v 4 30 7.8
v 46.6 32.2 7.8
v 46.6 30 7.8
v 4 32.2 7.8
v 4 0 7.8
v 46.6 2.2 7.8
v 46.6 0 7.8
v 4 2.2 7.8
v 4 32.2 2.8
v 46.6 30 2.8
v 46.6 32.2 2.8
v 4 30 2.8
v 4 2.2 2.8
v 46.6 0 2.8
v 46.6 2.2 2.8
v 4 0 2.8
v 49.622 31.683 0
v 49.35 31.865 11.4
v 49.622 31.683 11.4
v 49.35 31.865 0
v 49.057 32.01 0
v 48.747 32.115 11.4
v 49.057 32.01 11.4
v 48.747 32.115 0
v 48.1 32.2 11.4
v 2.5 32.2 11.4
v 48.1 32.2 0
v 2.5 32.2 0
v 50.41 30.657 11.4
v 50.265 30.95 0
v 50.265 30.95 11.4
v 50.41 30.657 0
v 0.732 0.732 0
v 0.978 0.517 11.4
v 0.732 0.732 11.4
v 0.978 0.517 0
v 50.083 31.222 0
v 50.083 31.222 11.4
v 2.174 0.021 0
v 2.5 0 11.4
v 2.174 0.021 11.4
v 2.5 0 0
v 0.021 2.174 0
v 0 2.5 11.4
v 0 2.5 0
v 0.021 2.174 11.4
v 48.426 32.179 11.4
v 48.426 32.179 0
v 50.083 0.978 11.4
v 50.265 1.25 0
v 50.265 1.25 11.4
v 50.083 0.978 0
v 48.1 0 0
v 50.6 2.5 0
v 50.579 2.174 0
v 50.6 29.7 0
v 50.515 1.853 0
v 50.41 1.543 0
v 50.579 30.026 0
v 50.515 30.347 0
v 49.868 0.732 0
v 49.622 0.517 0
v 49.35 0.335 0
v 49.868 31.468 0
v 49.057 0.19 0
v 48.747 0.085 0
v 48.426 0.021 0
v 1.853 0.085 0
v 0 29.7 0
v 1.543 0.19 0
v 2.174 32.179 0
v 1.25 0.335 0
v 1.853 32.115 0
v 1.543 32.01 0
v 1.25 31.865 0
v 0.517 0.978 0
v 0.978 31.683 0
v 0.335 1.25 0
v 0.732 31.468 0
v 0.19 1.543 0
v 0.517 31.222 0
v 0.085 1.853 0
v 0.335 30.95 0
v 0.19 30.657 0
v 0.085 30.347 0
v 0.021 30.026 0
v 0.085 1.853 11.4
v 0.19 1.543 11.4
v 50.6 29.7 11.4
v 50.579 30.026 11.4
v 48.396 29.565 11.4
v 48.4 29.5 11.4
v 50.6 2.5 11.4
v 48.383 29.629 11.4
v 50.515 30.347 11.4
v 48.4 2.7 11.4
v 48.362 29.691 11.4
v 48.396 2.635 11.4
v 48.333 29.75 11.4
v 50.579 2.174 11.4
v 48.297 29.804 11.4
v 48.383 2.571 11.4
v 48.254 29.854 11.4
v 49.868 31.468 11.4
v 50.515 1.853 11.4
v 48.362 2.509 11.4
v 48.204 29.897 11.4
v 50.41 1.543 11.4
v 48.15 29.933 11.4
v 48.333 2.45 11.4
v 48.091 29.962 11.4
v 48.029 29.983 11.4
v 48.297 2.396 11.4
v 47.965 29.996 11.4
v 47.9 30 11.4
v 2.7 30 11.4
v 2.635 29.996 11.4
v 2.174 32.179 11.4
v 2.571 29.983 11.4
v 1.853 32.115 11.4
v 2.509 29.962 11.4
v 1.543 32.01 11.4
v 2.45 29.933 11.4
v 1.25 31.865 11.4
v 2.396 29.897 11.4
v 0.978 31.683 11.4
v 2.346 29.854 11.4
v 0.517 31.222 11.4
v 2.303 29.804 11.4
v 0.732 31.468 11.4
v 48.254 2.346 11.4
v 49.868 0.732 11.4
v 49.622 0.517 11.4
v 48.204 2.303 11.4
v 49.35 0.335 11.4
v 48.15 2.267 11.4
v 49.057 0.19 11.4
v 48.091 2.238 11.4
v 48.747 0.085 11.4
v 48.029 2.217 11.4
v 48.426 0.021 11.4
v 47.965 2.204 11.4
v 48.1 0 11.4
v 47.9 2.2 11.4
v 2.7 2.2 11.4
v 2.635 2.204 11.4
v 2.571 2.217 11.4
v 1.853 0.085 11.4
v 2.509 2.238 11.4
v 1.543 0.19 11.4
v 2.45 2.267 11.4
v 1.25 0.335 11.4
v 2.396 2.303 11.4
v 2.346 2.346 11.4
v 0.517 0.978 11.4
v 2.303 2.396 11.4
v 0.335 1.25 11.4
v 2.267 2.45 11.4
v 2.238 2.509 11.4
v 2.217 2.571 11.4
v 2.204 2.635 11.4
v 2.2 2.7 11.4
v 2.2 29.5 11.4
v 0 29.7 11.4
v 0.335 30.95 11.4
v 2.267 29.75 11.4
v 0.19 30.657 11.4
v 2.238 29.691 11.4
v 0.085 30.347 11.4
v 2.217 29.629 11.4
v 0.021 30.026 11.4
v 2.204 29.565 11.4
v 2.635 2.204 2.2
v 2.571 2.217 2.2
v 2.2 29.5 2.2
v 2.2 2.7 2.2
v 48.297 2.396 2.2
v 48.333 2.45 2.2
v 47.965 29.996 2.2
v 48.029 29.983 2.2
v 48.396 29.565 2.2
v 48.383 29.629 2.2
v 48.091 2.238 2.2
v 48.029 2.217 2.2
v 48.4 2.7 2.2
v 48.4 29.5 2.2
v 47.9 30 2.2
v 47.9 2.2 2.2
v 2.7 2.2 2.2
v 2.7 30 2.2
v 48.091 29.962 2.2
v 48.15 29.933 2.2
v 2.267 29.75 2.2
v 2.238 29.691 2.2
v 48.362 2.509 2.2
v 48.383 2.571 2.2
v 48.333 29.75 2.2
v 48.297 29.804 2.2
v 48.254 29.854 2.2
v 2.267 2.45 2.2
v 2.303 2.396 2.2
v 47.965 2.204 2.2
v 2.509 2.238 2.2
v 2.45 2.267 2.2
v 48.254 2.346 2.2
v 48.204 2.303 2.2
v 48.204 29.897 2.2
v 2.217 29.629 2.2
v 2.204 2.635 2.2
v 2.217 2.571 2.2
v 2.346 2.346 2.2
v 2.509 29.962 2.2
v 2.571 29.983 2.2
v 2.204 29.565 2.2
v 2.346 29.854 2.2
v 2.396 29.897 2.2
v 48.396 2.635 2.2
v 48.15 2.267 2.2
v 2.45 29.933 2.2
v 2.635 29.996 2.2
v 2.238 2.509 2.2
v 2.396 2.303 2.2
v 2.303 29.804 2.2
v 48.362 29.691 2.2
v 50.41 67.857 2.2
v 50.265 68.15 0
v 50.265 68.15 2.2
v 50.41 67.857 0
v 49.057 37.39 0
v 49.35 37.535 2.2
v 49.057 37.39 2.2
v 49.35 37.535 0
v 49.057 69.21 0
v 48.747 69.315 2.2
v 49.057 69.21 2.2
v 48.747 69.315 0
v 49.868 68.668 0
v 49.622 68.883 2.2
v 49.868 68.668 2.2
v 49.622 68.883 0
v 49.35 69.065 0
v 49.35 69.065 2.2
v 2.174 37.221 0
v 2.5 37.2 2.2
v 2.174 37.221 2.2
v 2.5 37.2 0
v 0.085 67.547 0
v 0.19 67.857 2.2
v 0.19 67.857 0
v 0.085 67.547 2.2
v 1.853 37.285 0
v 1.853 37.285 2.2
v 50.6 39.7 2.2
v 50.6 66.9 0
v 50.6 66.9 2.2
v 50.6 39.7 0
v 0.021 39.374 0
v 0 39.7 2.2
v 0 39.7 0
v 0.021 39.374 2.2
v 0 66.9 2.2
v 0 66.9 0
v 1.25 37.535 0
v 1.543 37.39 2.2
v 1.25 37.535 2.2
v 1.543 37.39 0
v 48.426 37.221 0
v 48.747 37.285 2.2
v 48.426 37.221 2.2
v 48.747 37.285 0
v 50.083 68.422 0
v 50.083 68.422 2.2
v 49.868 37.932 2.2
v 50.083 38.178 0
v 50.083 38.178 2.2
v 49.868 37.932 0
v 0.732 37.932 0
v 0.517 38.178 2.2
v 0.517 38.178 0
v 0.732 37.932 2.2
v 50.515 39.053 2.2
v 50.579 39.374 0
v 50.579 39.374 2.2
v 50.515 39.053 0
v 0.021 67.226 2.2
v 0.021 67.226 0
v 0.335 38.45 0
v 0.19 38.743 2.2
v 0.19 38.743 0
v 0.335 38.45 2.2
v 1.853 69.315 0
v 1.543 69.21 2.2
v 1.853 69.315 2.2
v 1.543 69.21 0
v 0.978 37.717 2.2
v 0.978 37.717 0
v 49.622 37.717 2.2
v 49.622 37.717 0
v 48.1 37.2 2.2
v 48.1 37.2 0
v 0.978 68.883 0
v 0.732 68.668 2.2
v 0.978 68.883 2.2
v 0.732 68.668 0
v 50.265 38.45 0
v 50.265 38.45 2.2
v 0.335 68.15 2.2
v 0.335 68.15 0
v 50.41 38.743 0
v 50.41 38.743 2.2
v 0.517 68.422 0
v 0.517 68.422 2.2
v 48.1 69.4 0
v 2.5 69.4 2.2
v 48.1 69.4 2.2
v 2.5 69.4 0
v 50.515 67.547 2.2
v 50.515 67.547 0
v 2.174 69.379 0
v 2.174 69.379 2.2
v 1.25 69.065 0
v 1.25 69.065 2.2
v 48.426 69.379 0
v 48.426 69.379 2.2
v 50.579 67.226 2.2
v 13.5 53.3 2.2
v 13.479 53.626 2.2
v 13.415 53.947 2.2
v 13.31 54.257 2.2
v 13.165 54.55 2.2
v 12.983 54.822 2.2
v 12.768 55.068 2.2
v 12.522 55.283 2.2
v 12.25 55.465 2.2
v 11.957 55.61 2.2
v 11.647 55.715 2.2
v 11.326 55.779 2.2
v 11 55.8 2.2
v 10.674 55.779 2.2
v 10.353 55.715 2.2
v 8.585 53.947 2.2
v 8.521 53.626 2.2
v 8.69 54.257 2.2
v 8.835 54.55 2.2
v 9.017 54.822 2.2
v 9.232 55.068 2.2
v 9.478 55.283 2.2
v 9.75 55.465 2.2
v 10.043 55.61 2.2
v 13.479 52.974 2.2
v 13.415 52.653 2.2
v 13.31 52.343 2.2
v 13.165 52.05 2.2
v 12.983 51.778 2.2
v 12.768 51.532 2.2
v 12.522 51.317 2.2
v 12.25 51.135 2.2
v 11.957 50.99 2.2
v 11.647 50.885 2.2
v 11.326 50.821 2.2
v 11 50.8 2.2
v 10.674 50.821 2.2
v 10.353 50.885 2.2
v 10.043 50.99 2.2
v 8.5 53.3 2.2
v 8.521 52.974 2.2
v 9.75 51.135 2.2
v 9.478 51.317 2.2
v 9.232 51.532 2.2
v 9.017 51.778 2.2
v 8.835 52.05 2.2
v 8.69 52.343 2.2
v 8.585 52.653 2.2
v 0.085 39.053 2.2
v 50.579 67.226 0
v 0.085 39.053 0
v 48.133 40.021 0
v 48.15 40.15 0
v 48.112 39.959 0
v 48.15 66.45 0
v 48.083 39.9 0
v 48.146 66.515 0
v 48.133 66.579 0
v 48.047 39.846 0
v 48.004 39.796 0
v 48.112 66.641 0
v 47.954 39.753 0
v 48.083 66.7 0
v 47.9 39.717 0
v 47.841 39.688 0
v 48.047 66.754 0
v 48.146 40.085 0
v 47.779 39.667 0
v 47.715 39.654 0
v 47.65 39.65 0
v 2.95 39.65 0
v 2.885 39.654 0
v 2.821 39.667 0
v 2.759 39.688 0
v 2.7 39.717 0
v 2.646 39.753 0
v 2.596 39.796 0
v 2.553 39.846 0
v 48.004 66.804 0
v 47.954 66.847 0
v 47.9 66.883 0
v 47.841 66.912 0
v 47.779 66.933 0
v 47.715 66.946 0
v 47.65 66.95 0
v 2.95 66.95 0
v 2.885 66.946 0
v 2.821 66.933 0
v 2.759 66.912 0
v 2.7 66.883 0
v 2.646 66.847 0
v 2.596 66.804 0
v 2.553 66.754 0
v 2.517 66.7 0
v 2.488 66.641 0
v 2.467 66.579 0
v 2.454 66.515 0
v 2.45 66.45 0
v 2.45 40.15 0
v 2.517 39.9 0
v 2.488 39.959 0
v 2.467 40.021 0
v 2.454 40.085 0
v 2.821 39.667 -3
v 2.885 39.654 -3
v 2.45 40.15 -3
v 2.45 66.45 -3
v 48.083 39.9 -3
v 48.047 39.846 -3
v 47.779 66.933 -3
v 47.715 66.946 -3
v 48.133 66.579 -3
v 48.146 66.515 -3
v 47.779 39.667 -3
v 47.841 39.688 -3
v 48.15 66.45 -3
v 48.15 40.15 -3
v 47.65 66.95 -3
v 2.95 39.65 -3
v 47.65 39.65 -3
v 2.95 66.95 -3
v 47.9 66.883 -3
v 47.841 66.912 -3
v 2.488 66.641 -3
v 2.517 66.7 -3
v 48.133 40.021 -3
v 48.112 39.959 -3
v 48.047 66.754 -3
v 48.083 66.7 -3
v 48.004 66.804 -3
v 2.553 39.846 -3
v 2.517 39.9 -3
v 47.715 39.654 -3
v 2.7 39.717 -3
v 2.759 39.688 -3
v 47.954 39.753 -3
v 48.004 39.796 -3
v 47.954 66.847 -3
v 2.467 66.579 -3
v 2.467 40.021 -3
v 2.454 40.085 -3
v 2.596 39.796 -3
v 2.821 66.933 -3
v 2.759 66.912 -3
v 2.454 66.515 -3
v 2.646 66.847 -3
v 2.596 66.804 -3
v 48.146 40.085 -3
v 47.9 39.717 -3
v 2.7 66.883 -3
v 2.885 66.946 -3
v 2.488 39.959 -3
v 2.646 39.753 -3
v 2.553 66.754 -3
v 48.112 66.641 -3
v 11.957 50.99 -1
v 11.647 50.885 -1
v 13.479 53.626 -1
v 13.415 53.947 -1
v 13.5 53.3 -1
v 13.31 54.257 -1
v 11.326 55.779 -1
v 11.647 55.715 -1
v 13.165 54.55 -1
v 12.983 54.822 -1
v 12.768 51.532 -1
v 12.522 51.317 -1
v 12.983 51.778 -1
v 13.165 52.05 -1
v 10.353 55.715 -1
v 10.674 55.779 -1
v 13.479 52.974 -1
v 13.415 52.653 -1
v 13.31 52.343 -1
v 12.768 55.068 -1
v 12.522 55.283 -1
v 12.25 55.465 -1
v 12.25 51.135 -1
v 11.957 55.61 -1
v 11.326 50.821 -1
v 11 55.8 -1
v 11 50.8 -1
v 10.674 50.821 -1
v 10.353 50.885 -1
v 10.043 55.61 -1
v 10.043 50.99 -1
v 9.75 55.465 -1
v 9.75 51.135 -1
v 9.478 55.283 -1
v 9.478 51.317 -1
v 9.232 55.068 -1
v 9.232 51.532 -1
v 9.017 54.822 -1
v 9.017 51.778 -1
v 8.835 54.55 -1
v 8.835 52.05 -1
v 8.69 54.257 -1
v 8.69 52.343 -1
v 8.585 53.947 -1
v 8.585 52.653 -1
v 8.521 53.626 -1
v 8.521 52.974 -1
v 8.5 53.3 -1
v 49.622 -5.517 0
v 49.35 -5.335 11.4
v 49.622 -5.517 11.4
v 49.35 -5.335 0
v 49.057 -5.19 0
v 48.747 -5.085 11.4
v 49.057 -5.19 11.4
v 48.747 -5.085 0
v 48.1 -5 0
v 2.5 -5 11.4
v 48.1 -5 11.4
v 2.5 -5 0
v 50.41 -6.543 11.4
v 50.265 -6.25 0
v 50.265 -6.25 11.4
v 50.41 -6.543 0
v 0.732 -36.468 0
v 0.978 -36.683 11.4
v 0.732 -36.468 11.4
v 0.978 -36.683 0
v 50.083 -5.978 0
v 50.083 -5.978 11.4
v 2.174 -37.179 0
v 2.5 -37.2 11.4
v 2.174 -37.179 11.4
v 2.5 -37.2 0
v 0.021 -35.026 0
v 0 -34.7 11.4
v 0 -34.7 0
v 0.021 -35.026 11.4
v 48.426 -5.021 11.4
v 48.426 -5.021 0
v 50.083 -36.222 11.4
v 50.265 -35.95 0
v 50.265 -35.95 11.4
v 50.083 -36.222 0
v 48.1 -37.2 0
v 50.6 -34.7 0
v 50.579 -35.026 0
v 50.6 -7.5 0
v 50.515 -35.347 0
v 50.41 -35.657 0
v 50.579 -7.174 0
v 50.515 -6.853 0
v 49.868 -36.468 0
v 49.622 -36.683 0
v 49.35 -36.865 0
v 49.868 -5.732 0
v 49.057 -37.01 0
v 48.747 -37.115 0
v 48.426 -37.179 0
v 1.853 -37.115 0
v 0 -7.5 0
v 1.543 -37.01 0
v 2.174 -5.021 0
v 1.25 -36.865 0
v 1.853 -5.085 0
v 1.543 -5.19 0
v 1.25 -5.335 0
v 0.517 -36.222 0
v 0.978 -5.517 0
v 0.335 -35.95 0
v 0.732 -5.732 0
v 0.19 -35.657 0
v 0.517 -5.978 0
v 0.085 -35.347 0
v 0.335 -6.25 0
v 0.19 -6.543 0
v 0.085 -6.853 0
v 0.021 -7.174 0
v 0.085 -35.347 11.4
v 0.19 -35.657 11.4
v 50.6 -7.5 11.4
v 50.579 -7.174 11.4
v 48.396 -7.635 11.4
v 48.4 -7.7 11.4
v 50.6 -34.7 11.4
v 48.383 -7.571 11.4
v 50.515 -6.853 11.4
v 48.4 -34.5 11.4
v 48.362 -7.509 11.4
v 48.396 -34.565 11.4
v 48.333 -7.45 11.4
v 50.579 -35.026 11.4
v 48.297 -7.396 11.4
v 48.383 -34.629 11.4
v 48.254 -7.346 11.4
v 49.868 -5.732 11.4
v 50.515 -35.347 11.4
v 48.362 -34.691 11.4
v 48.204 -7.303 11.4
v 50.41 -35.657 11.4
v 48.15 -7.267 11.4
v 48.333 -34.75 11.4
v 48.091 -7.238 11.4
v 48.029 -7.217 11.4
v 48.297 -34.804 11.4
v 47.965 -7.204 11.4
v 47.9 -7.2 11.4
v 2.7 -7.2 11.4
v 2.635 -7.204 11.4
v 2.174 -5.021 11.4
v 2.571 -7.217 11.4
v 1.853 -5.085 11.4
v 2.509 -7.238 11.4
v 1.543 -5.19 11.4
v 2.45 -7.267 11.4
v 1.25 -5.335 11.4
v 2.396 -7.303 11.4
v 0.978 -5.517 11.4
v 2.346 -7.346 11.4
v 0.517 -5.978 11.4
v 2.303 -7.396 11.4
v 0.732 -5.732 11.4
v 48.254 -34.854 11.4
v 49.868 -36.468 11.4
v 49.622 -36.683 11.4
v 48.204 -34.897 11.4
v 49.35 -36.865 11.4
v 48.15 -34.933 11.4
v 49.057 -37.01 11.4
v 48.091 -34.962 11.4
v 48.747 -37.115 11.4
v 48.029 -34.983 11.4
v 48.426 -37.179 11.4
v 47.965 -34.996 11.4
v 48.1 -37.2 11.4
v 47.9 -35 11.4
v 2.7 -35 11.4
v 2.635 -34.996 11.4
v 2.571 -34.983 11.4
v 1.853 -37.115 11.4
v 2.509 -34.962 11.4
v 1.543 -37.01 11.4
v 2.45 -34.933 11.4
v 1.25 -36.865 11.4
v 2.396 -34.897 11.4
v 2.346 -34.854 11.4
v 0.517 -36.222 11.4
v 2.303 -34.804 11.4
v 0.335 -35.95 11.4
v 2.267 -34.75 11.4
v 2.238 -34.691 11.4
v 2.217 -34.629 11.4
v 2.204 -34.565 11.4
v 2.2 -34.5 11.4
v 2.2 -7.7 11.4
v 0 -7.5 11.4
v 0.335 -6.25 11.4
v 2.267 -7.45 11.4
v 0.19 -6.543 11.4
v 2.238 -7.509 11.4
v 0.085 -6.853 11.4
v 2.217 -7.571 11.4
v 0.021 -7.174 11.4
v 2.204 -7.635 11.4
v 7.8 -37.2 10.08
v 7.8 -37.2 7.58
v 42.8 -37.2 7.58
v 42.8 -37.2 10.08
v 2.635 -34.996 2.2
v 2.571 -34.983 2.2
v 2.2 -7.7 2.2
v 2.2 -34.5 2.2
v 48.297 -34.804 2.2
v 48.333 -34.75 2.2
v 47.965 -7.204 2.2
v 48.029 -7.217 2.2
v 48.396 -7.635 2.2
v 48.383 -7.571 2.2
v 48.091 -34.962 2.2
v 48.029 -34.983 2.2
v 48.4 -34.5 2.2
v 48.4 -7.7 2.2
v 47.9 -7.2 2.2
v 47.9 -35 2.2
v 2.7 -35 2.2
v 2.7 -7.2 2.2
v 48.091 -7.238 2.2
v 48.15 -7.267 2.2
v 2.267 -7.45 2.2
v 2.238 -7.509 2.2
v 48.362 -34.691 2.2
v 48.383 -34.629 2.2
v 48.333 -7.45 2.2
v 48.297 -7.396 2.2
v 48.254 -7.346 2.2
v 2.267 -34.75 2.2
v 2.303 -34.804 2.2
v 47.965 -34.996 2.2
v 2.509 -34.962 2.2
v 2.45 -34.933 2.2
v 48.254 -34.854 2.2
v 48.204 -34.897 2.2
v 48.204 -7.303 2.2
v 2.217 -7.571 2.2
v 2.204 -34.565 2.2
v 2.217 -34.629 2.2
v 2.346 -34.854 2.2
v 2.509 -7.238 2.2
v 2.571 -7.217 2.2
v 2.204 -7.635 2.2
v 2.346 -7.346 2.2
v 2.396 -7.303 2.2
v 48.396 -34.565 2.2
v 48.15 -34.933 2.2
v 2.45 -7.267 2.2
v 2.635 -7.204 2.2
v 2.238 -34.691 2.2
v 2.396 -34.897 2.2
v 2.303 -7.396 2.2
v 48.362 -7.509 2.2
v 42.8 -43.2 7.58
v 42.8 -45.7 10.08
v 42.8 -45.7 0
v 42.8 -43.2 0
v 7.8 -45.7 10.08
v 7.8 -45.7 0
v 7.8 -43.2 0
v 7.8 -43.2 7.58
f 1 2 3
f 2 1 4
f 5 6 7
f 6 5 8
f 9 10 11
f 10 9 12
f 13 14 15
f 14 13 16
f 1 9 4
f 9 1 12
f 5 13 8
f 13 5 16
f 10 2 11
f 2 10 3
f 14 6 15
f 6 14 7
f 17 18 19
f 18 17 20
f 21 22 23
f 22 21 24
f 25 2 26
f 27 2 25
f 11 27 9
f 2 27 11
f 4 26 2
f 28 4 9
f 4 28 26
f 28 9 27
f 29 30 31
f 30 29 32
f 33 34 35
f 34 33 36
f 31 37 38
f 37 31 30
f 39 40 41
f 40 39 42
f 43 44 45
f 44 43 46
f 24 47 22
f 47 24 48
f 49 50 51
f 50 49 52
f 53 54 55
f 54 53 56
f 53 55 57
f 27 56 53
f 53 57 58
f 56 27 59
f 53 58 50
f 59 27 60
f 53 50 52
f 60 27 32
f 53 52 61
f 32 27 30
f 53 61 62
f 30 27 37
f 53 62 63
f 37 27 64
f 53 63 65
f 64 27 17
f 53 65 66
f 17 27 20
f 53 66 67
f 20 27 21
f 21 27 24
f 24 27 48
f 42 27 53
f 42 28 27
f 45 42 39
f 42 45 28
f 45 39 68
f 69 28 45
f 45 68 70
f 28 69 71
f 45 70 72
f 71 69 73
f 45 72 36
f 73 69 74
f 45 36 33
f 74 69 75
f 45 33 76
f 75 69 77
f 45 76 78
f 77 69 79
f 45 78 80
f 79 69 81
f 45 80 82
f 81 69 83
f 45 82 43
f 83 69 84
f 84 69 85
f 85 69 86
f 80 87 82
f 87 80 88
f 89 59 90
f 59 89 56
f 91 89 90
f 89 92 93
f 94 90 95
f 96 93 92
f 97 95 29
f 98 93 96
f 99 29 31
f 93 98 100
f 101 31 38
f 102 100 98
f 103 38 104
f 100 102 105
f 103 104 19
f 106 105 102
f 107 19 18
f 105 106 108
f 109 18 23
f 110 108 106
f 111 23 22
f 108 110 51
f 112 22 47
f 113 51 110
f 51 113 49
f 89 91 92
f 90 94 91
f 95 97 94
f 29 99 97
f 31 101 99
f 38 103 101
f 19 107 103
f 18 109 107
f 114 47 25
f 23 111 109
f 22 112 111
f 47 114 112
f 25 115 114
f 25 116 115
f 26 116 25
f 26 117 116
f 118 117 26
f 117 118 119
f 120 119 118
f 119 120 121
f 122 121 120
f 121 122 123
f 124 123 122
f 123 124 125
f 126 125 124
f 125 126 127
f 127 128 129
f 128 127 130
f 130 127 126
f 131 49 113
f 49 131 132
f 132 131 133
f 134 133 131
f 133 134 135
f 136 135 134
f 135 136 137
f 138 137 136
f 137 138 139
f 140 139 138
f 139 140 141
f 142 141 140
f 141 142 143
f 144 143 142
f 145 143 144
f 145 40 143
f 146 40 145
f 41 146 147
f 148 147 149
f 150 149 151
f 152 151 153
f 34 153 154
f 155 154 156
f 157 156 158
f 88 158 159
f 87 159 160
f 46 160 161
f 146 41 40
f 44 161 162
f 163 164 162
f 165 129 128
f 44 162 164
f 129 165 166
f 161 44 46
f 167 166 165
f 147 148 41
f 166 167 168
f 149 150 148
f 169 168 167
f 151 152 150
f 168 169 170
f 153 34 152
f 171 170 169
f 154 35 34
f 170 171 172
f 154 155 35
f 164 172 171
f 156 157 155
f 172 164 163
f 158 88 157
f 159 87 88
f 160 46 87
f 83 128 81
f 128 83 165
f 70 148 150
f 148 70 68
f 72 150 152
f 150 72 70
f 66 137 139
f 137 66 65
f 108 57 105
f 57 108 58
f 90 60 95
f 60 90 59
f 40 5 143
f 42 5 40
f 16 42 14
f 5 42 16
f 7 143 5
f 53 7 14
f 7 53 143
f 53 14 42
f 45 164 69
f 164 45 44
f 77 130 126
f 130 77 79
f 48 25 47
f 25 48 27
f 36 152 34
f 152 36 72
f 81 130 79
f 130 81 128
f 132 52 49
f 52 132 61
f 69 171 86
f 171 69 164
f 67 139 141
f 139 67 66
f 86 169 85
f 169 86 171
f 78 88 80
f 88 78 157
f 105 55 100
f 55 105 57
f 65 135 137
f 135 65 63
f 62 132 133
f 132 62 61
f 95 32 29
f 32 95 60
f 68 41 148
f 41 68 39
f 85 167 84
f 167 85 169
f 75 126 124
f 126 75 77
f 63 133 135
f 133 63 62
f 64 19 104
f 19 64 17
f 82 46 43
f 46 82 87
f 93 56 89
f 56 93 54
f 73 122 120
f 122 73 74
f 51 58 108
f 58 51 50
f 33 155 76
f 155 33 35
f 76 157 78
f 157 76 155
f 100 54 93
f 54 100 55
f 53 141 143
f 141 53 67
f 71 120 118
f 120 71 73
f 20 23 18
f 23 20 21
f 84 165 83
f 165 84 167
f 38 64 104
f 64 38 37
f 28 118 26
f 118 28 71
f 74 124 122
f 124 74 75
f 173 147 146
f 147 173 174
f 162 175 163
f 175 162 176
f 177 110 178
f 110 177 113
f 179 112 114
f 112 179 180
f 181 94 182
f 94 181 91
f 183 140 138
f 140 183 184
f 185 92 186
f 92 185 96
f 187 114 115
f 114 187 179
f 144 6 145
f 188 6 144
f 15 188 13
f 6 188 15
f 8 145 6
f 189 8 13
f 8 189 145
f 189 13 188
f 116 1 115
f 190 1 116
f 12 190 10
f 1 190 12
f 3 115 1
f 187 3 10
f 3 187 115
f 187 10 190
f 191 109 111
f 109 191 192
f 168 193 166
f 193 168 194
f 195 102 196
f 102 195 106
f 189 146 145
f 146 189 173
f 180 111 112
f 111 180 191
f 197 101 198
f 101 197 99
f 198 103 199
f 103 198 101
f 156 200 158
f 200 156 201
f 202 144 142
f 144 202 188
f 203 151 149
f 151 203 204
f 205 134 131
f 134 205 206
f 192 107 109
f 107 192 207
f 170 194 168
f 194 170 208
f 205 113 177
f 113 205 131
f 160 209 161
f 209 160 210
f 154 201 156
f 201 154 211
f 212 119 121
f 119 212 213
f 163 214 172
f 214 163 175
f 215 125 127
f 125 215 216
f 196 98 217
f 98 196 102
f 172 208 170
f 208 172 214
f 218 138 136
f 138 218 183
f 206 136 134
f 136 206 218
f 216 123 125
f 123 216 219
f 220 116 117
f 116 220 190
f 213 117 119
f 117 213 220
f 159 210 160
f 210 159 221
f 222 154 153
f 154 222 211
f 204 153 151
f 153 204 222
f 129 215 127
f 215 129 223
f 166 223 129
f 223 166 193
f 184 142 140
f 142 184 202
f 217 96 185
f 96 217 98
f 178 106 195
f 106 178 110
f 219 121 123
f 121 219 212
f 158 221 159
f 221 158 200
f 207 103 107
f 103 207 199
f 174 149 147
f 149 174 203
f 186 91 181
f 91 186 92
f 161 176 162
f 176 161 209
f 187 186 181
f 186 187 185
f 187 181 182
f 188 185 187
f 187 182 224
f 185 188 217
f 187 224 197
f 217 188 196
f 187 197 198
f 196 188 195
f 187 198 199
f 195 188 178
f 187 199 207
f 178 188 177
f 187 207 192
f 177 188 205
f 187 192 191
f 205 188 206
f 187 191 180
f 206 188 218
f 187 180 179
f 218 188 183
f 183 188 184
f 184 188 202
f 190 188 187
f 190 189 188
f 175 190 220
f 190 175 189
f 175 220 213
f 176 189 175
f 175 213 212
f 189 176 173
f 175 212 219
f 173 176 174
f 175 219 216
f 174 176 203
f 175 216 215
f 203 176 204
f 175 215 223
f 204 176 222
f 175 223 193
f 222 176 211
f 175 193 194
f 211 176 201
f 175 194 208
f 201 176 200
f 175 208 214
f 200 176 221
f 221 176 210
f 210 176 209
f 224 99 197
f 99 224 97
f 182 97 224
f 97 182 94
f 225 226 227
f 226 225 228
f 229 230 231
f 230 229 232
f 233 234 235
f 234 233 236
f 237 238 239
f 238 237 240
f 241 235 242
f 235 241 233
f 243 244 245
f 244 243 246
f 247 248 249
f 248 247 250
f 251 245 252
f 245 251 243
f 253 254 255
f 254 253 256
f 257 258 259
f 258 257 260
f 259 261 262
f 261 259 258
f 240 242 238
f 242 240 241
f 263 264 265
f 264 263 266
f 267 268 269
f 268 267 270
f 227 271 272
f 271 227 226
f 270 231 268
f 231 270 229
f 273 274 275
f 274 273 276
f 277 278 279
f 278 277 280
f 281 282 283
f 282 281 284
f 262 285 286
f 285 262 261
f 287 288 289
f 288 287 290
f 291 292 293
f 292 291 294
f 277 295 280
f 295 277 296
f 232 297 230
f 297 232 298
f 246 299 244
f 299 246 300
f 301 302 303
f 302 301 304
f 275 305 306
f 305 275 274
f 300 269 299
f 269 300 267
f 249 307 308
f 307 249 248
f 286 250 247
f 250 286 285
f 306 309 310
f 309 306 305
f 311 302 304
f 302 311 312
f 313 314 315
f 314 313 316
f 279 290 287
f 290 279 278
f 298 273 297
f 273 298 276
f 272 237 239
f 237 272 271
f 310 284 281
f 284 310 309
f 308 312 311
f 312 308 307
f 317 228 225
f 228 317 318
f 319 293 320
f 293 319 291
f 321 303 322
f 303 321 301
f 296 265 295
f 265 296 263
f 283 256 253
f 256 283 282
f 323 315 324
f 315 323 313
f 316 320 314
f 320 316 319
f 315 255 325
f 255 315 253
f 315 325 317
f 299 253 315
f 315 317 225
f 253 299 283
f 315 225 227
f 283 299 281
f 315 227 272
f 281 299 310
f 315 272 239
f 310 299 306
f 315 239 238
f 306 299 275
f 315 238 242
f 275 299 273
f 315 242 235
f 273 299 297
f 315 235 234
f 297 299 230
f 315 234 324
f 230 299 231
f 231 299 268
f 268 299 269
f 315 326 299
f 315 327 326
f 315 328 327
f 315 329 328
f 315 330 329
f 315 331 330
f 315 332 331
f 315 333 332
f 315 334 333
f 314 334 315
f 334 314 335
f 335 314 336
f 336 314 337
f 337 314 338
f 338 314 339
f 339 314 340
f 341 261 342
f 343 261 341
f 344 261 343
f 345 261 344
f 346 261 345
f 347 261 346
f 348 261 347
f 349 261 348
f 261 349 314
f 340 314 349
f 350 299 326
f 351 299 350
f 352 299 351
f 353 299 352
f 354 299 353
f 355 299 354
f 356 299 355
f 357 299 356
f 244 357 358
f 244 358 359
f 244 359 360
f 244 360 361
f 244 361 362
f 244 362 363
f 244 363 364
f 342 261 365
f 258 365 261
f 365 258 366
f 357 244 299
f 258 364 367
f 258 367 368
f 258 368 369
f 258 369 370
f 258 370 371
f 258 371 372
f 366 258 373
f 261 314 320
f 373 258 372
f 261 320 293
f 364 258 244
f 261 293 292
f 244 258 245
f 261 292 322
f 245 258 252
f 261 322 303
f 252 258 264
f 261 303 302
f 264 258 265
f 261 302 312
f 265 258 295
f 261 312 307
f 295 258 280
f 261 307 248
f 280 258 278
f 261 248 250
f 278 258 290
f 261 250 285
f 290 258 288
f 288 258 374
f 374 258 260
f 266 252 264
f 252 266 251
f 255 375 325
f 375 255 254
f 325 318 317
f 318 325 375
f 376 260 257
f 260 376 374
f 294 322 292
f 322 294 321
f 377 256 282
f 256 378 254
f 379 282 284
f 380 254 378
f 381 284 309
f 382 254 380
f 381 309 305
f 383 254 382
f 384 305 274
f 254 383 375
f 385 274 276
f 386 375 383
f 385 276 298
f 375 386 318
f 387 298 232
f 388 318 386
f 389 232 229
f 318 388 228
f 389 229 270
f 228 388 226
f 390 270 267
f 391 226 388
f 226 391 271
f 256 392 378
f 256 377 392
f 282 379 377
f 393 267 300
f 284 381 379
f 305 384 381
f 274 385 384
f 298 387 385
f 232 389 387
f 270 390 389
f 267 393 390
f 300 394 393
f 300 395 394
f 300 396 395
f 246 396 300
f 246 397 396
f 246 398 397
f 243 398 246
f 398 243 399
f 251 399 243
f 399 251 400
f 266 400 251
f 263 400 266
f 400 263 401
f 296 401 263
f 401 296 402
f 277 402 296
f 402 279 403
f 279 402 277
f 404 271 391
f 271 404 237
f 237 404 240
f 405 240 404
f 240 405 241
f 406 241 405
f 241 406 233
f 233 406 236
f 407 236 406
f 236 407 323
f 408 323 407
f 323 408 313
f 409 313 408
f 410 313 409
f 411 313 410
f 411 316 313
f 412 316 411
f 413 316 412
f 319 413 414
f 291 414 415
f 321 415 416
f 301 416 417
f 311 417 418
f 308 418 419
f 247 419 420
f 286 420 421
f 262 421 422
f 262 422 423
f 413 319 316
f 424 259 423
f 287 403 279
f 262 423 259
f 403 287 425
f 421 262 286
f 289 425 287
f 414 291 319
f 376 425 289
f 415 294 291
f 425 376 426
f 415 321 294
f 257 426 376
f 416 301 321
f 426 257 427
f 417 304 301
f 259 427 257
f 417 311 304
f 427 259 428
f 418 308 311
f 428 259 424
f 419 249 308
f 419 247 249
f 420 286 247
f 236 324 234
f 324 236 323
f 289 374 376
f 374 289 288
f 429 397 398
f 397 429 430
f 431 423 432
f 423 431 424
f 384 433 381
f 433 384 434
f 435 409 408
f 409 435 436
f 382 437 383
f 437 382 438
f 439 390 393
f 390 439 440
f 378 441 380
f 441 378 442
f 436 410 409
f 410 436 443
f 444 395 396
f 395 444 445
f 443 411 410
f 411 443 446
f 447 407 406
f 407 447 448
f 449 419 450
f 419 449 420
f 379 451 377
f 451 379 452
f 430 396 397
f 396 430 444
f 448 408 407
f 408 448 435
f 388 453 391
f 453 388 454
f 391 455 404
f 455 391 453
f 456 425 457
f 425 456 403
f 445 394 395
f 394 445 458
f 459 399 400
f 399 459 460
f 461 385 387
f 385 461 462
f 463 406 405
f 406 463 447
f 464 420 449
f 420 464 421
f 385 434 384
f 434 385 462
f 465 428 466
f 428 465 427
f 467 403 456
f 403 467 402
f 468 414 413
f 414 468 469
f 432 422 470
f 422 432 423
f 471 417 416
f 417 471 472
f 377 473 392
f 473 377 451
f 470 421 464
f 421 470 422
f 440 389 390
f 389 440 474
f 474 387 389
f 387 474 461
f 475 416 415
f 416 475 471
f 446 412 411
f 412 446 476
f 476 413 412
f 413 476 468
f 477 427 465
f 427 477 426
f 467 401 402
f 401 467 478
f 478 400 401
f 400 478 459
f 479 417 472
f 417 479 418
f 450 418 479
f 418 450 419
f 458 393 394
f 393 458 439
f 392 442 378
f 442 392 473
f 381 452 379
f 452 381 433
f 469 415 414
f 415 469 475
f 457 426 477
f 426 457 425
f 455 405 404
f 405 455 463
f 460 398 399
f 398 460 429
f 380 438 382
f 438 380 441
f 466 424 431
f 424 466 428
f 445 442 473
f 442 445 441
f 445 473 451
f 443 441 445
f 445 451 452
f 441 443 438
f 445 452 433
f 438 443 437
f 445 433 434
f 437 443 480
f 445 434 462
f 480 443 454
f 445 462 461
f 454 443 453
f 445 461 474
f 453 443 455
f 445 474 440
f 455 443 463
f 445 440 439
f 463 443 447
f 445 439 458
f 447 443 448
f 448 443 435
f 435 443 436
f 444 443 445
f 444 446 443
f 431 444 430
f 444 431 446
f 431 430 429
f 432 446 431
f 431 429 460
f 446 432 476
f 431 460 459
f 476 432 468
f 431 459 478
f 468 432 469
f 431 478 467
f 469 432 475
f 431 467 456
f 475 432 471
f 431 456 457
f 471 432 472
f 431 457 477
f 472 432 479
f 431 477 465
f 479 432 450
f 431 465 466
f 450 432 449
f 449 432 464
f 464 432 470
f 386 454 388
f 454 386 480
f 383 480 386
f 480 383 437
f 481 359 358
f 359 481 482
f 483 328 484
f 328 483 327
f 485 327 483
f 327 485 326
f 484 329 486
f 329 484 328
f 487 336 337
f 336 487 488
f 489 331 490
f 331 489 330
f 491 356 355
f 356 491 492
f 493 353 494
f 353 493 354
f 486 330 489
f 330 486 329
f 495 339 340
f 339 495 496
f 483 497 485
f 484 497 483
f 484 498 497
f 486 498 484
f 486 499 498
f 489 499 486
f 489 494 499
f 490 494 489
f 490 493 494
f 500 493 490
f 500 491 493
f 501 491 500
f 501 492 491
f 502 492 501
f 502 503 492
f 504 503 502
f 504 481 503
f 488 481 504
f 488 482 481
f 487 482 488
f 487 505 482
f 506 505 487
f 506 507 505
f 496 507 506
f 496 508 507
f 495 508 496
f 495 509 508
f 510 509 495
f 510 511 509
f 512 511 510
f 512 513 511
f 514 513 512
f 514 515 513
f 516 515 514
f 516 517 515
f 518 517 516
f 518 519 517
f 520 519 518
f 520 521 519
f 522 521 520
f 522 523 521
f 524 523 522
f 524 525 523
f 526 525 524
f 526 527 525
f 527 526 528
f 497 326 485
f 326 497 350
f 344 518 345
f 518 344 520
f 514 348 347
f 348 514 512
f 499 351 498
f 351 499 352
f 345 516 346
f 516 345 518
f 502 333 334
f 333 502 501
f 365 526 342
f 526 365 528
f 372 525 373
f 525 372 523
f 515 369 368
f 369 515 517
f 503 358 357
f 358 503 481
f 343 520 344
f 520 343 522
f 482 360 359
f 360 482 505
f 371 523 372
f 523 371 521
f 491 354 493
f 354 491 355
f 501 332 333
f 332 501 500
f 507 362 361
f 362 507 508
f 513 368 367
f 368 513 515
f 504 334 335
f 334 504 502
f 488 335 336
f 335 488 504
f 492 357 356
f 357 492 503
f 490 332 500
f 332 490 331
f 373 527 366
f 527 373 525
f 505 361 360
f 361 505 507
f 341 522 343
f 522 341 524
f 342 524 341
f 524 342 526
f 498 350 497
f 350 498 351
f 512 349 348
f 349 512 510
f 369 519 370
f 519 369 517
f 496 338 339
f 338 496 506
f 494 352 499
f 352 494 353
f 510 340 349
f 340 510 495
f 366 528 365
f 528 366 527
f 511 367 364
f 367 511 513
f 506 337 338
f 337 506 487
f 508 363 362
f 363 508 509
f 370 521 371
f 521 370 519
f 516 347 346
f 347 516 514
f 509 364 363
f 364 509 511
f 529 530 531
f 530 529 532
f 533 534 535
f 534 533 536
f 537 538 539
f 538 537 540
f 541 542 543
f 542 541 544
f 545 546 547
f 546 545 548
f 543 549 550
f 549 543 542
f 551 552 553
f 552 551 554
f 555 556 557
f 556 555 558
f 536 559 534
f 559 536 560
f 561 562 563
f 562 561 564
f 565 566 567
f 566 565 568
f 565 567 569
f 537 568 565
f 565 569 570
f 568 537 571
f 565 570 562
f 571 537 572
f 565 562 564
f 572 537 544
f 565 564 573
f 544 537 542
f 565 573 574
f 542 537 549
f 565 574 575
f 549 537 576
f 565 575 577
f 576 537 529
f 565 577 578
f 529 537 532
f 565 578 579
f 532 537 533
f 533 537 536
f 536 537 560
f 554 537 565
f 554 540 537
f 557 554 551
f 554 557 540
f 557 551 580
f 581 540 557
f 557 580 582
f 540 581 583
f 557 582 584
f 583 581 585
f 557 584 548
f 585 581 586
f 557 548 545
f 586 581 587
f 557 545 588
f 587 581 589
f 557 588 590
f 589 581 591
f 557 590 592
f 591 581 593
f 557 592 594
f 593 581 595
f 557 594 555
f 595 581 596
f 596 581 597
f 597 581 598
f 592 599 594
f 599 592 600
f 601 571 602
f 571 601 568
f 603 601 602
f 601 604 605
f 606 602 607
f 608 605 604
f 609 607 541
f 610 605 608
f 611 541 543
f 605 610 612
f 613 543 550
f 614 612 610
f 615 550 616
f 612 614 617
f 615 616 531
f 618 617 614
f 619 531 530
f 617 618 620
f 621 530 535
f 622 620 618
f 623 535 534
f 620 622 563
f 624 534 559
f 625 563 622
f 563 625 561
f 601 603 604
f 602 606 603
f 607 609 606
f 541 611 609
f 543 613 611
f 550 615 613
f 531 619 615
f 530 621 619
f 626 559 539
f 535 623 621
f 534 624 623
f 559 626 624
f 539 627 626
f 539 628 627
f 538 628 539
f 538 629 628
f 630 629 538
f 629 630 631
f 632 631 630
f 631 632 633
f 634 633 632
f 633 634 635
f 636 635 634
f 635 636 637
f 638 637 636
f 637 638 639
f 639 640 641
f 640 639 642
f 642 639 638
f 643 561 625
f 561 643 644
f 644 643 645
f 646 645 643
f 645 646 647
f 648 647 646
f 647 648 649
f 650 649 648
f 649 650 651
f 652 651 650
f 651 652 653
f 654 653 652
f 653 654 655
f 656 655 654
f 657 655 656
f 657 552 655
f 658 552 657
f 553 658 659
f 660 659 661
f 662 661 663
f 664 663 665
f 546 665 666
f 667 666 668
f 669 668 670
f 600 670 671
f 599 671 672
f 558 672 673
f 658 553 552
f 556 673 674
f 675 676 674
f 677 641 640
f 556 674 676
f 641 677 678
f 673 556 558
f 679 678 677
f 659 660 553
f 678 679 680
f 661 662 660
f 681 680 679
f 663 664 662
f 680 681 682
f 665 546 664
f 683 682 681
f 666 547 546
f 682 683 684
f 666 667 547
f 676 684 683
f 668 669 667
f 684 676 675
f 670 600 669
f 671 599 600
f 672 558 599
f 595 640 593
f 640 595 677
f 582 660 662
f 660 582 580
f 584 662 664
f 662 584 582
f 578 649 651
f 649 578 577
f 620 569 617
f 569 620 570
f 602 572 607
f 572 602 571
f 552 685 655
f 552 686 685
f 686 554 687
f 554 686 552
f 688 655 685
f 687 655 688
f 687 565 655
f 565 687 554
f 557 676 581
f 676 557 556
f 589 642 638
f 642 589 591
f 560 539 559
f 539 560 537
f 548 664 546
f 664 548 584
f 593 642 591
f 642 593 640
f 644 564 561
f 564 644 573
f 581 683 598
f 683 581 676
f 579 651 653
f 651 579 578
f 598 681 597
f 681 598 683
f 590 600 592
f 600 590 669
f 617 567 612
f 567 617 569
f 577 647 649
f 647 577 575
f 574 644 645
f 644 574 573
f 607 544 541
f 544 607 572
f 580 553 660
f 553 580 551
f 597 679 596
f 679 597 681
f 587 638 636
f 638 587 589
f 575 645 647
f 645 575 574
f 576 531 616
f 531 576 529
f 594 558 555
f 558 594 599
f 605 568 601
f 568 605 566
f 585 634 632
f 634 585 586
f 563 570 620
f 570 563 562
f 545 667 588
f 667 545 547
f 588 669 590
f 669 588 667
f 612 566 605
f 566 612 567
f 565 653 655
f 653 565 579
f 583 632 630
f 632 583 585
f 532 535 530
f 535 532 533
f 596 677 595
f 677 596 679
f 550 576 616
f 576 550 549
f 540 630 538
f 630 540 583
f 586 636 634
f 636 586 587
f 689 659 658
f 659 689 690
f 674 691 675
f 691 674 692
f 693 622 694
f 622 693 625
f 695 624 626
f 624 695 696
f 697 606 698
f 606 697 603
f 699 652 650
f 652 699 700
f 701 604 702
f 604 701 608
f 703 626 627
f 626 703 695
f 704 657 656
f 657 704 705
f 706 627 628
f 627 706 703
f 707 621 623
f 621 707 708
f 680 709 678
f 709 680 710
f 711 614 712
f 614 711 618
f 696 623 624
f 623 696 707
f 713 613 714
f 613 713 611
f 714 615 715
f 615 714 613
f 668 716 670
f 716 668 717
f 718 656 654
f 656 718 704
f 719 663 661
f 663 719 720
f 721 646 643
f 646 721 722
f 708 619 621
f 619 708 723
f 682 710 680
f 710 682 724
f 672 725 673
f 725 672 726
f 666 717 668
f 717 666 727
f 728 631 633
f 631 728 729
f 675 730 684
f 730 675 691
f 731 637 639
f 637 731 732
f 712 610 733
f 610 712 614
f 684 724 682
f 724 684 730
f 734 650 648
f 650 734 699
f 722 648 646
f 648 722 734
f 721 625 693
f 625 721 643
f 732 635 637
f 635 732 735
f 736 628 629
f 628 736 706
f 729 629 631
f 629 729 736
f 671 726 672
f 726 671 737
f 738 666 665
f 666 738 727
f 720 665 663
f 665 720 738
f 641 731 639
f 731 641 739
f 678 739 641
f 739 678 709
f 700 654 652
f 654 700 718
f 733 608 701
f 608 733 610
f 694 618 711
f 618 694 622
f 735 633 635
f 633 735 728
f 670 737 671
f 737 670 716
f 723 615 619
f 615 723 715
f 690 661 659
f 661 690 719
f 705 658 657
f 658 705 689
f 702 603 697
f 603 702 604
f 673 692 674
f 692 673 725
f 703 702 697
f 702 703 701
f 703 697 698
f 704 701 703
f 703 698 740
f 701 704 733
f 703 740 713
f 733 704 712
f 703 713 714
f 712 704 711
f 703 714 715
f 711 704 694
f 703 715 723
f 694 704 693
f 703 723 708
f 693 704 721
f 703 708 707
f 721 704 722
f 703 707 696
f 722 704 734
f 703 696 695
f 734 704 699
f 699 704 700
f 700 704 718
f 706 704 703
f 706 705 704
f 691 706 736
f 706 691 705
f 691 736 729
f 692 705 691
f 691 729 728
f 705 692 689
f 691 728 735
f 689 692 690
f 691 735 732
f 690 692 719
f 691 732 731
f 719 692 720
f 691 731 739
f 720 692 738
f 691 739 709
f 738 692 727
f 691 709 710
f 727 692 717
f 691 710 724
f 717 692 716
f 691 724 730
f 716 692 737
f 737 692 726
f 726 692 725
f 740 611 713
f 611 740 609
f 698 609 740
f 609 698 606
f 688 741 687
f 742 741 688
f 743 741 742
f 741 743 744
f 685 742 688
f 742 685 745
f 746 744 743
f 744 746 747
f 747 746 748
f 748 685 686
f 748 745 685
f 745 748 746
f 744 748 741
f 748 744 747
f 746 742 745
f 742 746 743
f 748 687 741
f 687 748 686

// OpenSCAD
// enclosure.scad
//
// Parametric OpenSCAD enclosure for the obstacle-detection wristband pod.
//
// Render-verified headlessly (openscad CLI, 2021.01) on 2026-07-25: base,
// lid, and belt_clip_back all export as valid manifold geometry ("Simple:
// yes") with no warnings, and preview renders look like a sane hinged
// box + lid + clip. That confirms the CSG is well-formed - it does NOT
// confirm fit, since every dimension in the "[MEASURE YOUR PARTS]" block
// below is still a guess, not a caliper measurement. Re-render after
// updating that block, and before printing anything for real.
//
// Orientation convention used throughout this file:
//   X axis - the long axis of the pod, aligned with the wristband strap's
//            direction of travel around the wrist. The two strap lugs
//            (tunnels) sit near the two X ends of the pod.
//   Y axis - each lug's tunnel bore runs along Y, across the pod - like a
//            watch's spring-bar tunnel, perpendicular to the strap's
//            overall direction of travel. This is the "front/back, like
//            watch lugs" mount from the project handoff: a single-slot
//            design (one tunnel, strap folded back through it) was
//            considered and rejected because it would let the pod pivot
//            around that one wrap point instead of sitting flat.
//   Z axis - up. The lid (+Z) carries the sensor window and faces
//            outward, away from the skin. The base (-Z) sits against
//            the wrist.
//
// Which part to render: set `part` below, or override from the command
// line, e.g.:
//   openscad -D 'part="base"' -o base.stl enclosure.scad

part = "all";  // "base" | "lid" | "wristband_back" | "belt_clip_back" | "all"

// ============================================================
// [MEASURE YOUR PARTS] -- every value below is a PLACEHOLDER,
// guessed from typical part sizes, not measured. Update these
// from real calipers before printing anything for real - see
// BUILD_CHECKLIST.md / PURCHASE_LIST.md for sourcing calipers.
// ============================================================

nano_length       = 45;  // Arduino Nano clone, long edge
nano_width        = 18;  // short edge
nano_stack_height = 8;   // PCB + header pins + USB-C connector, stacked

tof_length       = 14;  // VL53L0X breakout board (e.g. GY-53) - see
tof_width        = 8;   // PURCHASE_LIST.md, no walk-in Almaty store had a
tof_stack_height = 4;   // VL53L1X in stock as of this writing
tof_window_dia   = 5;   // clear aperture needed in front of the sensor lens

motor_dia       = 10;  // vibration motor (10x3mm "pancake" type)
motor_thickness = 3;

// LiPo POUCH cell dimensions - NOT YET RECONCILED with the battery
// actually confirmed available walk-in (an 18650 cylindrical cell, see
// PURCHASE_LIST.md's battery note). An 18650 (18mm dia x 65mm long) is a
// different shape entirely and won't fit this rectangular cavity - if
// that's the battery in hand, this section needs a real redesign (a
// cylindrical bay), not just new numbers. Left as a flat-pouch placeholder
// pending confirmation of which battery is actually being used.
battery_length    = 25;  // LiPo pouch cell
battery_width     = 20;
battery_thickness = 6;

strap_width     = 20;  // wristband strap
strap_thickness = 3;

// ============================================================
// Derived / design parameters -- reasonable defaults, less
// urgent to re-measure than the block above, but still worth
// checking once parts are in hand.
// ============================================================

wall_thickness    = 2.2;   // ~3-4 perimeters at a typical 0.4mm nozzle
fit_clearance     = 0.6;   // extra room around each component - not a press fit
lid_lip_height    = 3;     // how far the lid's inner lip plugs into the base
lid_lip_clearance = 0.25;  // friction-fit gap - tune per printer/material
corner_radius     = 2.5;   // cosmetic, and softens stress concentration/print artifacts

strap_slot_width  = strap_width + 1.5;   // strap needs to slide through freely
strap_slot_height = strap_thickness + 2;
strap_slot_inset  = 4;  // how far each lug tunnel sits in from the pod's X ends

belt_clip_arm_length = 35;
belt_clip_gap        = 6;    // fits a typical belt/waistband strap
belt_clip_thickness  = 2.5;

// Internal cavity sized to fit the tallest component, with everything
// else assumed to sit beside it on the floor of the base - this is a
// simplified layout, not a precision placement, which isn't meaningful
// until the [MEASURE YOUR PARTS] block above holds real numbers anyway.
internal_length = max(nano_length, battery_length) + fit_clearance * 2;
internal_width  = nano_width + tof_width + fit_clearance * 3;
internal_height = max(nano_stack_height, tof_stack_height, motor_thickness, battery_thickness)
                   + fit_clearance * 2;

outer_length = internal_length + wall_thickness * 2;
outer_width  = internal_width + wall_thickness * 2;
outer_height = internal_height + wall_thickness + lid_lip_height;

$fn = 48;

module rounded_box(size, radius) {
    x = size[0]; y = size[1]; z = size[2];
    hull() {
        for (dx = [radius, x - radius])
            for (dy = [radius, y - radius])
                translate([dx, dy, 0])
                    cylinder(r = radius, h = z);
    }
}

module wristband_slots() {
    // Two lug tunnels, positioned near each end of the pod (X), boring
    // through in Y so the strap can pass side to side. Low enough (Z)
    // that they don't reach into the lid's seam.
    slot_z = wall_thickness + fit_clearance;
    for (slot_x = [strap_slot_inset, outer_length - strap_slot_inset - strap_slot_width])
        translate([slot_x, -1, slot_z])
            cube([strap_slot_width, outer_width + 2, strap_slot_height]);
}

module base() {
    difference() {
        rounded_box([outer_length, outer_width, outer_height - lid_lip_height], corner_radius);

        translate([wall_thickness, wall_thickness, wall_thickness])
            rounded_box(
                [outer_length - wall_thickness * 2, outer_width - wall_thickness * 2, outer_height],
                max(corner_radius - wall_thickness, 0.5)
            );

        wristband_slots();
    }
}

module lid() {
    difference() {
        union() {
            rounded_box([outer_length, outer_width, wall_thickness], corner_radius);

            // Inner lip that plugs into the base for a friction-fit close.
            translate([wall_thickness + lid_lip_clearance, wall_thickness + lid_lip_clearance, -lid_lip_height])
                rounded_box(
                    [outer_length - (wall_thickness + lid_lip_clearance) * 2,
                     outer_width - (wall_thickness + lid_lip_clearance) * 2,
                     lid_lip_height],
                    max(corner_radius - wall_thickness, 0.5)
                );
        }

        // Sensor window, centered over where the ToF sensor sits near one
        // end (X) - see README.md's wiring diagram for which end faces
        // forward when worn.
        translate([strap_slot_inset + tof_length / 2, outer_width / 2, -1])
            cylinder(d = tof_window_dia, h = wall_thickness + 2);
    }
}

module wristband_back() {
    // v1 primary mount. No extra geometry beyond base() itself - the
    // strap lug tunnels are already cut into it. This module exists so
    // "which back are you printing" is an explicit choice, matching
    // belt_clip_back() below.
    base();
}

module belt_clip_back() {
    // Alternative mount: cantilevered belt clip instead of a wristband
    // strap. NOT trusted as-is - needs print-and-test iteration. Clip
    // flex/grip depends heavily on printer, material, and layer
    // orientation, none of which is known yet.
    difference() {
        rounded_box([outer_length, outer_width, outer_height - lid_lip_height], corner_radius);
        translate([wall_thickness, wall_thickness, wall_thickness])
            rounded_box(
                [outer_length - wall_thickness * 2, outer_width - wall_thickness * 2, outer_height],
                max(corner_radius - wall_thickness, 0.5)
            );
    }

    clip_height = outer_height * 0.7;

    // Vertical arm, standing off the back of the pod.
    translate([outer_length / 2 - belt_clip_arm_length / 2, -belt_clip_gap - belt_clip_thickness, 0])
        cube([belt_clip_arm_length, belt_clip_thickness, clip_height]);

    // Return lip at the top of the arm, closing the gap back toward the
    // pod so a belt/waistband is captured between them.
    translate([outer_length / 2 - belt_clip_arm_length / 2, -belt_clip_gap - belt_clip_thickness, clip_height - belt_clip_thickness])
        cube([belt_clip_arm_length, belt_clip_gap + belt_clip_thickness, belt_clip_thickness]);
}

module render_all() {
    wristband_back();
    translate([0, outer_width + 5, 0]) lid();
    translate([0, -(outer_width + 5), 0]) belt_clip_back();
}

if (part == "base" || part == "wristband_back") wristband_back();
else if (part == "lid") lid();
else if (part == "belt_clip_back") belt_clip_back();
else render_all();
